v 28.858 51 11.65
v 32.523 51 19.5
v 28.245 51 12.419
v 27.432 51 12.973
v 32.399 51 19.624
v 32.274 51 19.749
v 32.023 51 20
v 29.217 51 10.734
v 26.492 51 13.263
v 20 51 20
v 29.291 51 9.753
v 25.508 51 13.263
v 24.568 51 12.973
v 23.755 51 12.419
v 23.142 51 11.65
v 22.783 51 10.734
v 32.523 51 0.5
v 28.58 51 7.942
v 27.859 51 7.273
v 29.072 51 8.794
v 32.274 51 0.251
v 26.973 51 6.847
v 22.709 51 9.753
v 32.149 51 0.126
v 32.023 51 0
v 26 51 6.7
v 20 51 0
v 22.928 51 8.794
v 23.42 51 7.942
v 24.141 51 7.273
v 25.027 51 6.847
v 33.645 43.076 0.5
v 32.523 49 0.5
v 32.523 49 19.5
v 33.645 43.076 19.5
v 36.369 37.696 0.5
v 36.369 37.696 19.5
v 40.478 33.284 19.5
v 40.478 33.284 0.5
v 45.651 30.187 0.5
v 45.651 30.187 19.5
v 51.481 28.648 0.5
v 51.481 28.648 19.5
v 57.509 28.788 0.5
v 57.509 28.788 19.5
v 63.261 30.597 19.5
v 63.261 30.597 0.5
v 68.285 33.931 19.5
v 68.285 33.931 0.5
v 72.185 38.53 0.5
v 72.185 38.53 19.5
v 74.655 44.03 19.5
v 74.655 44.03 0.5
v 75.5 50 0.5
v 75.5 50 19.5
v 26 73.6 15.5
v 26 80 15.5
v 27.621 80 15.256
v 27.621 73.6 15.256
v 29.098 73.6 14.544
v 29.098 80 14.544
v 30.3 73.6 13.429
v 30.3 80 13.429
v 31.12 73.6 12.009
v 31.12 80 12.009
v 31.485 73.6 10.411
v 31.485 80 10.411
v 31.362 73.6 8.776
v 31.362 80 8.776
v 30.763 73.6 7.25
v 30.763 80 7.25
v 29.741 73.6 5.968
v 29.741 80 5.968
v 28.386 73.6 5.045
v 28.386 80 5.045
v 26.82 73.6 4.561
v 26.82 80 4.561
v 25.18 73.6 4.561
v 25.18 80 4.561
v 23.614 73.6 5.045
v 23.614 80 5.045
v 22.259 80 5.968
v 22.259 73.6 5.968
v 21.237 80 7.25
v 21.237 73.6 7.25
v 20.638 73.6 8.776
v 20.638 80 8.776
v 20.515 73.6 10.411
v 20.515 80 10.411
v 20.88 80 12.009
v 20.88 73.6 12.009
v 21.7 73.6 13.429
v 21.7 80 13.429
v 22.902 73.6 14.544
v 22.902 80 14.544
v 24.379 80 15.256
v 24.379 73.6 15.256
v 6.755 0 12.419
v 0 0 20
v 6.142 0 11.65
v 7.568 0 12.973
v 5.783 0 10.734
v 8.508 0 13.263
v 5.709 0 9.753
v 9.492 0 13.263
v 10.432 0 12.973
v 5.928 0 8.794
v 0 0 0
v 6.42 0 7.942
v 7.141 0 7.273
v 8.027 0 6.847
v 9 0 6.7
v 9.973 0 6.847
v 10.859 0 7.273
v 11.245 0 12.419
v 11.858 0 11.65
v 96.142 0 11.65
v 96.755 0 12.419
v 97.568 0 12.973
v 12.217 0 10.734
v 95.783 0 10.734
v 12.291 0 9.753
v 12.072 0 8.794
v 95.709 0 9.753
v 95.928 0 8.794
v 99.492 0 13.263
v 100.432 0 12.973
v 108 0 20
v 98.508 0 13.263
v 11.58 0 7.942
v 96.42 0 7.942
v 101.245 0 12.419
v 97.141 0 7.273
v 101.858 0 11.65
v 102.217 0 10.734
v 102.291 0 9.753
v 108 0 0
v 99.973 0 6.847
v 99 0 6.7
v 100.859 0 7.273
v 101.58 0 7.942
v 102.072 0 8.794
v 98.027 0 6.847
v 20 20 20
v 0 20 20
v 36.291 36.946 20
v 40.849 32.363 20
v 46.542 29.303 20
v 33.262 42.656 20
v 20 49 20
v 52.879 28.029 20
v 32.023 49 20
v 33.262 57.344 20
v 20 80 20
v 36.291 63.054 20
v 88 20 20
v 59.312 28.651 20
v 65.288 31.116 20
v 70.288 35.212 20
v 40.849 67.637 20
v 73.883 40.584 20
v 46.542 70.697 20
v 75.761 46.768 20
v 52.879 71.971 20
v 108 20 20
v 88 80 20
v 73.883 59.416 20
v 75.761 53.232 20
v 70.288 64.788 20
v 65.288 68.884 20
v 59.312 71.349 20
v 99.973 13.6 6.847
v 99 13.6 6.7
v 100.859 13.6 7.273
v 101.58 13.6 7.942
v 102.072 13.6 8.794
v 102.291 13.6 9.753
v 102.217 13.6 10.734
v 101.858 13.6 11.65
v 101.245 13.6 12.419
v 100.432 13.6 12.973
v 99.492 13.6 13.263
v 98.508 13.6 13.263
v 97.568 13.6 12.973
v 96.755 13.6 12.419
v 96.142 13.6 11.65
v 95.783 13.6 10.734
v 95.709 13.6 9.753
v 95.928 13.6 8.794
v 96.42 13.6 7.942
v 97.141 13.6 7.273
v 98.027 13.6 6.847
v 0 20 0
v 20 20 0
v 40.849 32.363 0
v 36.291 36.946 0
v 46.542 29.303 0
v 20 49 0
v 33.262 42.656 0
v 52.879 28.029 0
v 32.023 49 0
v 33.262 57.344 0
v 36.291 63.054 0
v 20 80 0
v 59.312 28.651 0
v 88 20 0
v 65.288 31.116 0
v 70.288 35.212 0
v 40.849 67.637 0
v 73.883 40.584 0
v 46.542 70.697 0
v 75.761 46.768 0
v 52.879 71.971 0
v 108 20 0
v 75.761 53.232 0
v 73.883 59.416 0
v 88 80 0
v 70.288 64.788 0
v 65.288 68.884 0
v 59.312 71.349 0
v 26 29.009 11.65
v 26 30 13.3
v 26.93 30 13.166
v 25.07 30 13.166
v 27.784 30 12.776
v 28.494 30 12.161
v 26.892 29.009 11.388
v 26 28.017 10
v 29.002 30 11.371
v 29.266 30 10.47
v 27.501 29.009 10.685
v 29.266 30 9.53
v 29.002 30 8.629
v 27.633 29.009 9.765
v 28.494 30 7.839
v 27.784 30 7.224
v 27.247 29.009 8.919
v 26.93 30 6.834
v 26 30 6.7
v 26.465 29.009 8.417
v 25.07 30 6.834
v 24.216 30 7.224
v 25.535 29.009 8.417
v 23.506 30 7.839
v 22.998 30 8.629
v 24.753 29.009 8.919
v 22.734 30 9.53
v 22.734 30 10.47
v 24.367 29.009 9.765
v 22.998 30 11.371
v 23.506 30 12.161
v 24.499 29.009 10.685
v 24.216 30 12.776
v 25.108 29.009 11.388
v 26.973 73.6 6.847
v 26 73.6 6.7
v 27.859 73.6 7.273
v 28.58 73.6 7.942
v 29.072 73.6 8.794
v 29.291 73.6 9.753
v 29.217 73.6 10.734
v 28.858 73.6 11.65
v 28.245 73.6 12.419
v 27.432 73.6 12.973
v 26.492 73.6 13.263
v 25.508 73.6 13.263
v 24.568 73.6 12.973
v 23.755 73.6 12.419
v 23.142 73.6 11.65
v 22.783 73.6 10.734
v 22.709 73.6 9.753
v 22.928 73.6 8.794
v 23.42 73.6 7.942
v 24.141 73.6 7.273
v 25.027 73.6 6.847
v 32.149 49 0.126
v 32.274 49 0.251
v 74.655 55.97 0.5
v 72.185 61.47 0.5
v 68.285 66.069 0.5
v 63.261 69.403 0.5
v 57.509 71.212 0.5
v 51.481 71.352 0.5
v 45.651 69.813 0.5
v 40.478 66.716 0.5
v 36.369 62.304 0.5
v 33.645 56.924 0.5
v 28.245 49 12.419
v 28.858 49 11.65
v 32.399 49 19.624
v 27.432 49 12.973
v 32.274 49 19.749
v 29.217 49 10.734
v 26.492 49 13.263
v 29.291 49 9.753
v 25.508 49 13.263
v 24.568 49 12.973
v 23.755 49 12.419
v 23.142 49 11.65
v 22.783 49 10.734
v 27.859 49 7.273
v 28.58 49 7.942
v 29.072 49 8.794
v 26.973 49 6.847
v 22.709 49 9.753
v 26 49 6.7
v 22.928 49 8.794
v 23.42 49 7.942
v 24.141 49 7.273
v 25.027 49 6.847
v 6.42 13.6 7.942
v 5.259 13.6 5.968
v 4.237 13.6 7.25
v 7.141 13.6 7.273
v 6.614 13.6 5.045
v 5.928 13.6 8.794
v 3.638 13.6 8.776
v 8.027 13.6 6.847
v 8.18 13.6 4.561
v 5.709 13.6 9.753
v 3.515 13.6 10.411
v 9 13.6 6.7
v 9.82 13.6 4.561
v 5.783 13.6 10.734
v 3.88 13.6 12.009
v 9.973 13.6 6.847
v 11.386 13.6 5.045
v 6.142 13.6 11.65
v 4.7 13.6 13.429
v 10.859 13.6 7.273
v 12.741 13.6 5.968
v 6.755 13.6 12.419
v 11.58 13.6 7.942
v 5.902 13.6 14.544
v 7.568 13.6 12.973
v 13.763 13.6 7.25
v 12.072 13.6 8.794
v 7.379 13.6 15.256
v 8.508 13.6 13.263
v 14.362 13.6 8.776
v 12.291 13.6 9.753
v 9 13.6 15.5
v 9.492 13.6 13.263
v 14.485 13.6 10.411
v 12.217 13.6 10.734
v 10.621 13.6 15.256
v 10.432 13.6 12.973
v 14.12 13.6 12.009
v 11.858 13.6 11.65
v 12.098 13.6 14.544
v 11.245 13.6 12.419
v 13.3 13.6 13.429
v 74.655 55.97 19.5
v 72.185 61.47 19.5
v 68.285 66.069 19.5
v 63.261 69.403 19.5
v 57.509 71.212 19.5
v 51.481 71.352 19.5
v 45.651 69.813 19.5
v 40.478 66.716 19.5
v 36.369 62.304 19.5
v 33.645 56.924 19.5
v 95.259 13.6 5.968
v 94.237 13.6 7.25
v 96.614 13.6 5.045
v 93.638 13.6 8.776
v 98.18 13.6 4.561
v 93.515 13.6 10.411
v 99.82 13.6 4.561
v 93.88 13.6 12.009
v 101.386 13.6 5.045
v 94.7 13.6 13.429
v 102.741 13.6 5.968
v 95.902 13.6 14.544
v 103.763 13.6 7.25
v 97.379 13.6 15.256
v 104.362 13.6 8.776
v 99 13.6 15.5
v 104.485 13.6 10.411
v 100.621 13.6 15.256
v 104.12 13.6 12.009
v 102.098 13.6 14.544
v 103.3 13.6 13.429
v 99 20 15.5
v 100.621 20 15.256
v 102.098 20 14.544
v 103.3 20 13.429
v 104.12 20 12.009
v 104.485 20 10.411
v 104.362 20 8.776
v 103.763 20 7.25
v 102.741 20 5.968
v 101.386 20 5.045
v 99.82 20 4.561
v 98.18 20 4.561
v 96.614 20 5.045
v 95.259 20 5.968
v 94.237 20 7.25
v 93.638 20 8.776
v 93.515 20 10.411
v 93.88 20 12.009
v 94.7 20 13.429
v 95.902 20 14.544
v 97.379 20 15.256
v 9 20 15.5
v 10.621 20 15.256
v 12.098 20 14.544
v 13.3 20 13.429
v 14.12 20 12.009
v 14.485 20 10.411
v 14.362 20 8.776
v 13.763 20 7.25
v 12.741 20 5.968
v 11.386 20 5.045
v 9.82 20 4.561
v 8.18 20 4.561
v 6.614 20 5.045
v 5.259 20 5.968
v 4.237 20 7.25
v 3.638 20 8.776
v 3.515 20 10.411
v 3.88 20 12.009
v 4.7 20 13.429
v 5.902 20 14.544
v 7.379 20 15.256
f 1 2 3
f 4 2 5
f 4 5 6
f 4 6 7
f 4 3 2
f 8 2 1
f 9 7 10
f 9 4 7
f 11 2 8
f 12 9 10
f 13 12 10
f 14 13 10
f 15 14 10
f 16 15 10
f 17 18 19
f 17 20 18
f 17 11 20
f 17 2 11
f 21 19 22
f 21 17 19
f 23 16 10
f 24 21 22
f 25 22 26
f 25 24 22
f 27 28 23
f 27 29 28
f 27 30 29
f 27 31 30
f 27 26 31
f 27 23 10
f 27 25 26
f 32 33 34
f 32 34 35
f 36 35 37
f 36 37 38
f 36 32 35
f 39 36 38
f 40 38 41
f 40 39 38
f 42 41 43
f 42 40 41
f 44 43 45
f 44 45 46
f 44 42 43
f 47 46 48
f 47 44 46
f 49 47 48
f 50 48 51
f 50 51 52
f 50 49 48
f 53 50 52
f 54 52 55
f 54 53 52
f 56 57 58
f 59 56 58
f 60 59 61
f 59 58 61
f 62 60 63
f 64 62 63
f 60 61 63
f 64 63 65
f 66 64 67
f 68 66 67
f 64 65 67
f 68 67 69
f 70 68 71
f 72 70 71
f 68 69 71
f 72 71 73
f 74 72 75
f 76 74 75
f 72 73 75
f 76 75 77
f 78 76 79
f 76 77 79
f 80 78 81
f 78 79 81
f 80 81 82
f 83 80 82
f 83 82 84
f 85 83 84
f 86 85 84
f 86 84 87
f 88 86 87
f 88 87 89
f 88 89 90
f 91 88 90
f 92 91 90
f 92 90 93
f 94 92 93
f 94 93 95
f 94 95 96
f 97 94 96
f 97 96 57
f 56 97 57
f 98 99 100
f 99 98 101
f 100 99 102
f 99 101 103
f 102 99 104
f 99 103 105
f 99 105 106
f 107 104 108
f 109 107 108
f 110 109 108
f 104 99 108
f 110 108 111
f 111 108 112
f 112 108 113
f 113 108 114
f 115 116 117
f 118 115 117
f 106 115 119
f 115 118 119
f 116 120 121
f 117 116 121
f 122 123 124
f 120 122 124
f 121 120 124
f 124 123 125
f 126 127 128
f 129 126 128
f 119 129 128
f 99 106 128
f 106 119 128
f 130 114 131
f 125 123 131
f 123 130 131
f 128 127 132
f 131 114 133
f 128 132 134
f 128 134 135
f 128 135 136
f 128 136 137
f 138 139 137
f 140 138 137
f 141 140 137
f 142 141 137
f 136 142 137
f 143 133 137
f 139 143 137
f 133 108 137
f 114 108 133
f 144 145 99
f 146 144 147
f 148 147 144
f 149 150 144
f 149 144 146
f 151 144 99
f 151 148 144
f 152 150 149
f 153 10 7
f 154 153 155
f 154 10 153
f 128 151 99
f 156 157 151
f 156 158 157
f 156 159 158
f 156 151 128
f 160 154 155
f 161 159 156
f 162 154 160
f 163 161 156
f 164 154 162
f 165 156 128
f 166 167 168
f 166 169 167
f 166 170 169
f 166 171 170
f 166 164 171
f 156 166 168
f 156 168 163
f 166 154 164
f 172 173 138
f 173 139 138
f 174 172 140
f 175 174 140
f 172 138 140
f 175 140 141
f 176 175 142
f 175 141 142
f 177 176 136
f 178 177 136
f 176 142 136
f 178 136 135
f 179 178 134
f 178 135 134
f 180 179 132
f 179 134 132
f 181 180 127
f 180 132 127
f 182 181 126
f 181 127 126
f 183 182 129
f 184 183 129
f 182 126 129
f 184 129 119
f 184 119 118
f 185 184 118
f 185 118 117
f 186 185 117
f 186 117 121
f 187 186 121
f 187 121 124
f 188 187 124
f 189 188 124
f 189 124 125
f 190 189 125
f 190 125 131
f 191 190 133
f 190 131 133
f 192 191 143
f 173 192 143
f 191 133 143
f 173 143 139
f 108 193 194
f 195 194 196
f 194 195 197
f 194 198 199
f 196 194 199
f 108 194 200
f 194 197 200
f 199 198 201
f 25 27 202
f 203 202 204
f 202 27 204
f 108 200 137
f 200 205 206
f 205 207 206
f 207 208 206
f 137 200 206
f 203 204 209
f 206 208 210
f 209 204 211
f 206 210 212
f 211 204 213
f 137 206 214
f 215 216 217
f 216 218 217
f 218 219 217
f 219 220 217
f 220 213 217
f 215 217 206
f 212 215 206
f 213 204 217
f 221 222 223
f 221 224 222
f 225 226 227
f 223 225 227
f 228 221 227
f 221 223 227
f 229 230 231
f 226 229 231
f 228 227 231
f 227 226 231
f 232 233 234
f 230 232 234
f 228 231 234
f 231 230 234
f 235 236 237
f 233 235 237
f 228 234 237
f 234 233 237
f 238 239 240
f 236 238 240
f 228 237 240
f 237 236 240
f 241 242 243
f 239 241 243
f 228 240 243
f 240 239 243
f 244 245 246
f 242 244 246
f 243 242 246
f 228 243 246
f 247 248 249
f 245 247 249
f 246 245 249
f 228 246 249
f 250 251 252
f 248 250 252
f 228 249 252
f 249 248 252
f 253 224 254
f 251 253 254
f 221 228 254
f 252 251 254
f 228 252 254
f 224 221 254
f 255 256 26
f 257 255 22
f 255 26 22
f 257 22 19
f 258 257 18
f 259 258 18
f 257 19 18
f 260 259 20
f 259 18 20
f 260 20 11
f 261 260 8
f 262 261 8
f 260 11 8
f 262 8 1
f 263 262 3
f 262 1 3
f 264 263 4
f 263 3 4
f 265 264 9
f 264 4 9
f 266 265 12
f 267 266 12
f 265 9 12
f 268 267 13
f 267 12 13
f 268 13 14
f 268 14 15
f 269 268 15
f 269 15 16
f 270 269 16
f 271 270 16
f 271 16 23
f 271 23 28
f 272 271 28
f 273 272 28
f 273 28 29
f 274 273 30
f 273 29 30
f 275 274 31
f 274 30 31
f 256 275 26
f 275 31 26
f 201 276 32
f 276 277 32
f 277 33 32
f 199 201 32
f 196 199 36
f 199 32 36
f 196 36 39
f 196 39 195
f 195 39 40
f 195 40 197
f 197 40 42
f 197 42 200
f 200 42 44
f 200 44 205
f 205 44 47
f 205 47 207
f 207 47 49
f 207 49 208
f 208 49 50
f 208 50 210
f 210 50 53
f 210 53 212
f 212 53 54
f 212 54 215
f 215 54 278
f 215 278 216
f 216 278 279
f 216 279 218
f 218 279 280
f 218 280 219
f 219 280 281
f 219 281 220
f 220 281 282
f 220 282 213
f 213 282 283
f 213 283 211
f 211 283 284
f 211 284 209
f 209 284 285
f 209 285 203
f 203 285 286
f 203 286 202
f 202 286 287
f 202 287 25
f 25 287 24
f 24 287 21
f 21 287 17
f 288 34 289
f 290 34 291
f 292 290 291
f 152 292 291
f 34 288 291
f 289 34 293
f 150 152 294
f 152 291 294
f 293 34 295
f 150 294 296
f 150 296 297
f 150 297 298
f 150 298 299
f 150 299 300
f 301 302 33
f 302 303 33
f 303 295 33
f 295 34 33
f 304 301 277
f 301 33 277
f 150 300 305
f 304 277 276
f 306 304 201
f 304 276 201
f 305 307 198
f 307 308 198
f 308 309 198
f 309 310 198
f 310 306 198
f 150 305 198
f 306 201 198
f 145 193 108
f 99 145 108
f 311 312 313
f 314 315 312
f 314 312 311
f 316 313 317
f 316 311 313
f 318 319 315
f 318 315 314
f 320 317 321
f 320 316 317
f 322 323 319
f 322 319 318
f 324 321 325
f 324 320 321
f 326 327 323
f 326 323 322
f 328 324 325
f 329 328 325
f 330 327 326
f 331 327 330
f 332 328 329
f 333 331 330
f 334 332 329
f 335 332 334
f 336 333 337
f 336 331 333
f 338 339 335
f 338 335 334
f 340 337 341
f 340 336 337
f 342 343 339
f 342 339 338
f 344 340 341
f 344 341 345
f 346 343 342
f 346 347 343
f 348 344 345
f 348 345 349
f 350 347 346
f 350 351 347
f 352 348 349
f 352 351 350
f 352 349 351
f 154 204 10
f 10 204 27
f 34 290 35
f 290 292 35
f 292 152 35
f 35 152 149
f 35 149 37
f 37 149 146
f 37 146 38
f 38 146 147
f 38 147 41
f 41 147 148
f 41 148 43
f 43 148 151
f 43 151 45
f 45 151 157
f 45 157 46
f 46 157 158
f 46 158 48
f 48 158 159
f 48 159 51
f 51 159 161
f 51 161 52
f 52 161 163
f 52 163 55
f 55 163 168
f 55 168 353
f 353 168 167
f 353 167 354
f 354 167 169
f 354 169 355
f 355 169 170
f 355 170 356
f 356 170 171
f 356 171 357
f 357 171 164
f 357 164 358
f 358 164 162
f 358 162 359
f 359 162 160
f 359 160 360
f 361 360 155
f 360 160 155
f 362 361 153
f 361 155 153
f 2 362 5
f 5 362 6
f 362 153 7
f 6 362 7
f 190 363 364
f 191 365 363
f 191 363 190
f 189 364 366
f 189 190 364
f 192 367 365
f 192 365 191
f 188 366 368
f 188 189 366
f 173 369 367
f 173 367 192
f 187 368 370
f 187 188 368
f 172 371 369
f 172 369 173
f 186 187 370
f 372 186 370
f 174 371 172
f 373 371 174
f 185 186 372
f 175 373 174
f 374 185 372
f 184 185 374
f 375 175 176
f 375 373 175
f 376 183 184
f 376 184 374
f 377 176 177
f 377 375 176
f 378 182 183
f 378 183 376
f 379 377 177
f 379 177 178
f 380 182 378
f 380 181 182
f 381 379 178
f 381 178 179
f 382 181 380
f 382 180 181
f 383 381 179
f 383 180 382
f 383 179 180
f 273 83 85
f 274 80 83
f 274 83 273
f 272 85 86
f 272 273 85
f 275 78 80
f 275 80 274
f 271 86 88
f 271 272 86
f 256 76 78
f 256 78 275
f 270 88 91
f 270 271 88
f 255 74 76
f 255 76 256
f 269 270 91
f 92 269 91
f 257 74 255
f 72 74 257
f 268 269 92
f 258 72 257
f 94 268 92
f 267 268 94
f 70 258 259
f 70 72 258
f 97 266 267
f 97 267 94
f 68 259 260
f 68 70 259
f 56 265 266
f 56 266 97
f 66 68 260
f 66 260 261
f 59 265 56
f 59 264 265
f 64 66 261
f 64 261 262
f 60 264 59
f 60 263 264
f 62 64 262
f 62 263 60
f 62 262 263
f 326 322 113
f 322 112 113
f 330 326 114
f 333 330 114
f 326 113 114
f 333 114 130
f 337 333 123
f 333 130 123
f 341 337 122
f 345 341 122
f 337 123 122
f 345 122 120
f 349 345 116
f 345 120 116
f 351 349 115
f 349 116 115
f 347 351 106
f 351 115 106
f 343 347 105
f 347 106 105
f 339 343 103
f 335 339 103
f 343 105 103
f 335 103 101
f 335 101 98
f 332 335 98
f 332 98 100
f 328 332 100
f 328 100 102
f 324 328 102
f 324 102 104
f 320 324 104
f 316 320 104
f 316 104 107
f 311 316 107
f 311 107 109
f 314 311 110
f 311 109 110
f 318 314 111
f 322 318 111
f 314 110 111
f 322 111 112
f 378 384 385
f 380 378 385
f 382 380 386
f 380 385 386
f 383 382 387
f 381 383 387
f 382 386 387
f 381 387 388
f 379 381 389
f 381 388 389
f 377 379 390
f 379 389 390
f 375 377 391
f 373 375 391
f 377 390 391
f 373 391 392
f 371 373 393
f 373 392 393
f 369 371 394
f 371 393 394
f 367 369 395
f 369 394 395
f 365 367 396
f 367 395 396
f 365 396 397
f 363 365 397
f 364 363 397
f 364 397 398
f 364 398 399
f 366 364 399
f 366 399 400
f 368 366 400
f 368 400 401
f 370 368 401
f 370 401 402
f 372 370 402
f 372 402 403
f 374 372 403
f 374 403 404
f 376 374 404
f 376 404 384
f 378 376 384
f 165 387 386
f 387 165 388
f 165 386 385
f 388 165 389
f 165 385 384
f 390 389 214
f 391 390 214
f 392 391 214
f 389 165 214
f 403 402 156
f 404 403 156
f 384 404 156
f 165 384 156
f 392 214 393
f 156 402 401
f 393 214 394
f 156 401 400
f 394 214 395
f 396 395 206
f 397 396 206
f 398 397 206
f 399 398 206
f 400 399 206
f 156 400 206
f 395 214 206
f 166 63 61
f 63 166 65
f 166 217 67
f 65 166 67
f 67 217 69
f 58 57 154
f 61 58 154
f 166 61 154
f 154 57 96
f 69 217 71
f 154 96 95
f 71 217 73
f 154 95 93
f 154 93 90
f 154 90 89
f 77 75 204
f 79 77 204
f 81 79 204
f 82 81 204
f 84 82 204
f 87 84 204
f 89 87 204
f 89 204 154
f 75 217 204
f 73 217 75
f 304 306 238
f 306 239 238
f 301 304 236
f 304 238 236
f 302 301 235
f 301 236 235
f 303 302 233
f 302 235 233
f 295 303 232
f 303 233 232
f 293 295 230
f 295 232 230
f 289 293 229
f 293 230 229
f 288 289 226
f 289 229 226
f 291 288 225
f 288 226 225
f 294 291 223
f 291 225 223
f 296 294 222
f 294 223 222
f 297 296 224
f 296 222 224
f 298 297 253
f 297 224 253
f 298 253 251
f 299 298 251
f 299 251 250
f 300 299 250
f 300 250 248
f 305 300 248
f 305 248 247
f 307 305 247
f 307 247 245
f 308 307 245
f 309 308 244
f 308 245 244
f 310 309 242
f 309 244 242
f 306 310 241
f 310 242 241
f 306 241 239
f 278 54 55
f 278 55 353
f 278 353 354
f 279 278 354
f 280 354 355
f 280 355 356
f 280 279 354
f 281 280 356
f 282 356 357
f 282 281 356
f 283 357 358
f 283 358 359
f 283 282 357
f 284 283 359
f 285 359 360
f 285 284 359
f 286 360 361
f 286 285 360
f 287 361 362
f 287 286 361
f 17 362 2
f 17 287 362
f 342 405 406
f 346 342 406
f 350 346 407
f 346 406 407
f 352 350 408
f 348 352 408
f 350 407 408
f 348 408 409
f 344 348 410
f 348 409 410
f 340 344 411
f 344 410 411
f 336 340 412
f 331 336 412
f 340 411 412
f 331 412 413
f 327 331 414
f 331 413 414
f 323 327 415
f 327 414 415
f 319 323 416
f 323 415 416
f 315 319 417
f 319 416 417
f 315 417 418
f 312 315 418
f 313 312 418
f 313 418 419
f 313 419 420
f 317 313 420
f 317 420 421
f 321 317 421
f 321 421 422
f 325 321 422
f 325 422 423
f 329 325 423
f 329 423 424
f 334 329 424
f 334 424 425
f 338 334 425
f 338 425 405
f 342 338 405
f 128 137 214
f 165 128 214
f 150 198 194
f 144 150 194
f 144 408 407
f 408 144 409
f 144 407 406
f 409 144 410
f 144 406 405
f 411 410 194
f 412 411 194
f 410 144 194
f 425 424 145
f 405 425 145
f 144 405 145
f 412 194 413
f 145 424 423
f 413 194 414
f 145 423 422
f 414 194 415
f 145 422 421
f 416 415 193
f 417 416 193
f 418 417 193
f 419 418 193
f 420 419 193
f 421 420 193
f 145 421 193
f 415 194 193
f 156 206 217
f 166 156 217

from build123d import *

# Parameters (mm, degrees)
SCHIZZO1_R                                           = 21.5
ESTRUSIONE_ESTRUSIONE1_DEPTH                         = 20
FORO_LAMATO_PER_VITE_M6_A_TESTA_CILINDRI_D           = 6.6
FORO_LAMATO_PER_VITE_M6_A_TESTA_CILINDRI_CBORE_D     = 11
FORO_LAMATO_PER_VITE_M6_A_TESTA_CILINDRI_CBORE_DEPTH = 6.4
CBORE_FOR_M6_HEX_SOCKET_HEAD_CAP_SCREW1_D            = 6.6
CBORE_FOR_M6_HEX_SOCKET_HEAD_CAP_SCREW1_DEPTH        = 50
CBORE_FOR_M6_HEX_SOCKET_HEAD_CAP_SCREW1_CBORE_D      = 11
CBORE_FOR_M6_HEX_SOCKET_HEAD_CAP_SCREW1_CBORE_DEPTH  = 6.4
CBORE_FOR_M6_HEX_SOCKET_HEAD_CAP_SCREW1_TIP          = 1.982840043
SCHIZZO7_W                                           = 15.52137419
SCHIZZO7_H                                           = 2
TAGLIO_ESTRUSIONE1_DEPTH                             = 136.882302012
CHAMFER1_SIZE                                        = 0.5
CHAMFER2_SIZE                                        = 0.5


with BuildPart() as part:
    # Schizzo1 → Estrusione-Estrusione1 (new body)
    with BuildSketch(Plane.XY):
        Polygon((0, 0), (108, 0), (108, 20), (88, 20), (88, 80), (20, 80), (20, 20), (0, 20), align=None)
        with Locations((54, 50)):
            Circle(SCHIZZO1_R, mode=Mode.SUBTRACT)
    extrude(amount=ESTRUSIONE_ESTRUSIONE1_DEPTH)

    # Foro lamato per Vite M6 a testa cilindrica-1 (through all)
    with Locations(Plane(origin=(9, 20, 10), x_dir=(0, 0, 1), z_dir=(0, 1, 0))):
        with Locations((0, 0), (0, 90)):
            CounterBoreHole(FORO_LAMATO_PER_VITE_M6_A_TESTA_CILINDRI_D / 2, FORO_LAMATO_PER_VITE_M6_A_TESTA_CILINDRI_CBORE_D / 2, FORO_LAMATO_PER_VITE_M6_A_TESTA_CILINDRI_CBORE_DEPTH)

    # CBORE for M6 Hex Socket Head Cap Screw1
    with Locations(Plane(origin=(26, 80, 10), x_dir=(0, 0, 1), z_dir=(0, 1, 0))):
        with Locations((0, 0)):
            CounterBoreHole(CBORE_FOR_M6_HEX_SOCKET_HEAD_CAP_SCREW1_D / 2, CBORE_FOR_M6_HEX_SOCKET_HEAD_CAP_SCREW1_CBORE_D / 2, CBORE_FOR_M6_HEX_SOCKET_HEAD_CAP_SCREW1_CBORE_DEPTH, depth=CBORE_FOR_M6_HEX_SOCKET_HEAD_CAP_SCREW1_DEPTH)
            with Locations((0, 0, -(CBORE_FOR_M6_HEX_SOCKET_HEAD_CAP_SCREW1_DEPTH + CBORE_FOR_M6_HEX_SOCKET_HEAD_CAP_SCREW1_TIP / 2))):  # 118° drill point
                Cone(0, CBORE_FOR_M6_HEX_SOCKET_HEAD_CAP_SCREW1_D / 2, CBORE_FOR_M6_HEX_SOCKET_HEAD_CAP_SCREW1_TIP, mode=Mode.SUBTRACT)

    # Schizzo7 → Taglio-Estrusione1 (cut, through all)
    with BuildSketch(Plane(origin=(0, 0, 0), x_dir=(-1, 0, 0), z_dir=(0, 0, -1))):
        with Locations((-27.66540179, 50)):
            Rectangle(SCHIZZO7_W, SCHIZZO7_H)
    extrude(amount=-TAGLIO_ESTRUSIONE1_DEPTH, mode=Mode.SUBTRACT)

    # Chamfer1
    chamfer1_edges = [part.edges().sort_by_distance(p)[0] for p in [
        (54.500135336, 71.494182112, 0),
    ]]
    chamfer(chamfer1_edges, length=CHAMFER1_SIZE)

    # Chamfer2
    chamfer2_edges = [part.edges().sort_by_distance(p)[0] for p in [
        (54.500135336, 28.505817888, 20),
    ]]
    chamfer(chamfer2_edges, length=CHAMFER2_SIZE)


solid = part.part
